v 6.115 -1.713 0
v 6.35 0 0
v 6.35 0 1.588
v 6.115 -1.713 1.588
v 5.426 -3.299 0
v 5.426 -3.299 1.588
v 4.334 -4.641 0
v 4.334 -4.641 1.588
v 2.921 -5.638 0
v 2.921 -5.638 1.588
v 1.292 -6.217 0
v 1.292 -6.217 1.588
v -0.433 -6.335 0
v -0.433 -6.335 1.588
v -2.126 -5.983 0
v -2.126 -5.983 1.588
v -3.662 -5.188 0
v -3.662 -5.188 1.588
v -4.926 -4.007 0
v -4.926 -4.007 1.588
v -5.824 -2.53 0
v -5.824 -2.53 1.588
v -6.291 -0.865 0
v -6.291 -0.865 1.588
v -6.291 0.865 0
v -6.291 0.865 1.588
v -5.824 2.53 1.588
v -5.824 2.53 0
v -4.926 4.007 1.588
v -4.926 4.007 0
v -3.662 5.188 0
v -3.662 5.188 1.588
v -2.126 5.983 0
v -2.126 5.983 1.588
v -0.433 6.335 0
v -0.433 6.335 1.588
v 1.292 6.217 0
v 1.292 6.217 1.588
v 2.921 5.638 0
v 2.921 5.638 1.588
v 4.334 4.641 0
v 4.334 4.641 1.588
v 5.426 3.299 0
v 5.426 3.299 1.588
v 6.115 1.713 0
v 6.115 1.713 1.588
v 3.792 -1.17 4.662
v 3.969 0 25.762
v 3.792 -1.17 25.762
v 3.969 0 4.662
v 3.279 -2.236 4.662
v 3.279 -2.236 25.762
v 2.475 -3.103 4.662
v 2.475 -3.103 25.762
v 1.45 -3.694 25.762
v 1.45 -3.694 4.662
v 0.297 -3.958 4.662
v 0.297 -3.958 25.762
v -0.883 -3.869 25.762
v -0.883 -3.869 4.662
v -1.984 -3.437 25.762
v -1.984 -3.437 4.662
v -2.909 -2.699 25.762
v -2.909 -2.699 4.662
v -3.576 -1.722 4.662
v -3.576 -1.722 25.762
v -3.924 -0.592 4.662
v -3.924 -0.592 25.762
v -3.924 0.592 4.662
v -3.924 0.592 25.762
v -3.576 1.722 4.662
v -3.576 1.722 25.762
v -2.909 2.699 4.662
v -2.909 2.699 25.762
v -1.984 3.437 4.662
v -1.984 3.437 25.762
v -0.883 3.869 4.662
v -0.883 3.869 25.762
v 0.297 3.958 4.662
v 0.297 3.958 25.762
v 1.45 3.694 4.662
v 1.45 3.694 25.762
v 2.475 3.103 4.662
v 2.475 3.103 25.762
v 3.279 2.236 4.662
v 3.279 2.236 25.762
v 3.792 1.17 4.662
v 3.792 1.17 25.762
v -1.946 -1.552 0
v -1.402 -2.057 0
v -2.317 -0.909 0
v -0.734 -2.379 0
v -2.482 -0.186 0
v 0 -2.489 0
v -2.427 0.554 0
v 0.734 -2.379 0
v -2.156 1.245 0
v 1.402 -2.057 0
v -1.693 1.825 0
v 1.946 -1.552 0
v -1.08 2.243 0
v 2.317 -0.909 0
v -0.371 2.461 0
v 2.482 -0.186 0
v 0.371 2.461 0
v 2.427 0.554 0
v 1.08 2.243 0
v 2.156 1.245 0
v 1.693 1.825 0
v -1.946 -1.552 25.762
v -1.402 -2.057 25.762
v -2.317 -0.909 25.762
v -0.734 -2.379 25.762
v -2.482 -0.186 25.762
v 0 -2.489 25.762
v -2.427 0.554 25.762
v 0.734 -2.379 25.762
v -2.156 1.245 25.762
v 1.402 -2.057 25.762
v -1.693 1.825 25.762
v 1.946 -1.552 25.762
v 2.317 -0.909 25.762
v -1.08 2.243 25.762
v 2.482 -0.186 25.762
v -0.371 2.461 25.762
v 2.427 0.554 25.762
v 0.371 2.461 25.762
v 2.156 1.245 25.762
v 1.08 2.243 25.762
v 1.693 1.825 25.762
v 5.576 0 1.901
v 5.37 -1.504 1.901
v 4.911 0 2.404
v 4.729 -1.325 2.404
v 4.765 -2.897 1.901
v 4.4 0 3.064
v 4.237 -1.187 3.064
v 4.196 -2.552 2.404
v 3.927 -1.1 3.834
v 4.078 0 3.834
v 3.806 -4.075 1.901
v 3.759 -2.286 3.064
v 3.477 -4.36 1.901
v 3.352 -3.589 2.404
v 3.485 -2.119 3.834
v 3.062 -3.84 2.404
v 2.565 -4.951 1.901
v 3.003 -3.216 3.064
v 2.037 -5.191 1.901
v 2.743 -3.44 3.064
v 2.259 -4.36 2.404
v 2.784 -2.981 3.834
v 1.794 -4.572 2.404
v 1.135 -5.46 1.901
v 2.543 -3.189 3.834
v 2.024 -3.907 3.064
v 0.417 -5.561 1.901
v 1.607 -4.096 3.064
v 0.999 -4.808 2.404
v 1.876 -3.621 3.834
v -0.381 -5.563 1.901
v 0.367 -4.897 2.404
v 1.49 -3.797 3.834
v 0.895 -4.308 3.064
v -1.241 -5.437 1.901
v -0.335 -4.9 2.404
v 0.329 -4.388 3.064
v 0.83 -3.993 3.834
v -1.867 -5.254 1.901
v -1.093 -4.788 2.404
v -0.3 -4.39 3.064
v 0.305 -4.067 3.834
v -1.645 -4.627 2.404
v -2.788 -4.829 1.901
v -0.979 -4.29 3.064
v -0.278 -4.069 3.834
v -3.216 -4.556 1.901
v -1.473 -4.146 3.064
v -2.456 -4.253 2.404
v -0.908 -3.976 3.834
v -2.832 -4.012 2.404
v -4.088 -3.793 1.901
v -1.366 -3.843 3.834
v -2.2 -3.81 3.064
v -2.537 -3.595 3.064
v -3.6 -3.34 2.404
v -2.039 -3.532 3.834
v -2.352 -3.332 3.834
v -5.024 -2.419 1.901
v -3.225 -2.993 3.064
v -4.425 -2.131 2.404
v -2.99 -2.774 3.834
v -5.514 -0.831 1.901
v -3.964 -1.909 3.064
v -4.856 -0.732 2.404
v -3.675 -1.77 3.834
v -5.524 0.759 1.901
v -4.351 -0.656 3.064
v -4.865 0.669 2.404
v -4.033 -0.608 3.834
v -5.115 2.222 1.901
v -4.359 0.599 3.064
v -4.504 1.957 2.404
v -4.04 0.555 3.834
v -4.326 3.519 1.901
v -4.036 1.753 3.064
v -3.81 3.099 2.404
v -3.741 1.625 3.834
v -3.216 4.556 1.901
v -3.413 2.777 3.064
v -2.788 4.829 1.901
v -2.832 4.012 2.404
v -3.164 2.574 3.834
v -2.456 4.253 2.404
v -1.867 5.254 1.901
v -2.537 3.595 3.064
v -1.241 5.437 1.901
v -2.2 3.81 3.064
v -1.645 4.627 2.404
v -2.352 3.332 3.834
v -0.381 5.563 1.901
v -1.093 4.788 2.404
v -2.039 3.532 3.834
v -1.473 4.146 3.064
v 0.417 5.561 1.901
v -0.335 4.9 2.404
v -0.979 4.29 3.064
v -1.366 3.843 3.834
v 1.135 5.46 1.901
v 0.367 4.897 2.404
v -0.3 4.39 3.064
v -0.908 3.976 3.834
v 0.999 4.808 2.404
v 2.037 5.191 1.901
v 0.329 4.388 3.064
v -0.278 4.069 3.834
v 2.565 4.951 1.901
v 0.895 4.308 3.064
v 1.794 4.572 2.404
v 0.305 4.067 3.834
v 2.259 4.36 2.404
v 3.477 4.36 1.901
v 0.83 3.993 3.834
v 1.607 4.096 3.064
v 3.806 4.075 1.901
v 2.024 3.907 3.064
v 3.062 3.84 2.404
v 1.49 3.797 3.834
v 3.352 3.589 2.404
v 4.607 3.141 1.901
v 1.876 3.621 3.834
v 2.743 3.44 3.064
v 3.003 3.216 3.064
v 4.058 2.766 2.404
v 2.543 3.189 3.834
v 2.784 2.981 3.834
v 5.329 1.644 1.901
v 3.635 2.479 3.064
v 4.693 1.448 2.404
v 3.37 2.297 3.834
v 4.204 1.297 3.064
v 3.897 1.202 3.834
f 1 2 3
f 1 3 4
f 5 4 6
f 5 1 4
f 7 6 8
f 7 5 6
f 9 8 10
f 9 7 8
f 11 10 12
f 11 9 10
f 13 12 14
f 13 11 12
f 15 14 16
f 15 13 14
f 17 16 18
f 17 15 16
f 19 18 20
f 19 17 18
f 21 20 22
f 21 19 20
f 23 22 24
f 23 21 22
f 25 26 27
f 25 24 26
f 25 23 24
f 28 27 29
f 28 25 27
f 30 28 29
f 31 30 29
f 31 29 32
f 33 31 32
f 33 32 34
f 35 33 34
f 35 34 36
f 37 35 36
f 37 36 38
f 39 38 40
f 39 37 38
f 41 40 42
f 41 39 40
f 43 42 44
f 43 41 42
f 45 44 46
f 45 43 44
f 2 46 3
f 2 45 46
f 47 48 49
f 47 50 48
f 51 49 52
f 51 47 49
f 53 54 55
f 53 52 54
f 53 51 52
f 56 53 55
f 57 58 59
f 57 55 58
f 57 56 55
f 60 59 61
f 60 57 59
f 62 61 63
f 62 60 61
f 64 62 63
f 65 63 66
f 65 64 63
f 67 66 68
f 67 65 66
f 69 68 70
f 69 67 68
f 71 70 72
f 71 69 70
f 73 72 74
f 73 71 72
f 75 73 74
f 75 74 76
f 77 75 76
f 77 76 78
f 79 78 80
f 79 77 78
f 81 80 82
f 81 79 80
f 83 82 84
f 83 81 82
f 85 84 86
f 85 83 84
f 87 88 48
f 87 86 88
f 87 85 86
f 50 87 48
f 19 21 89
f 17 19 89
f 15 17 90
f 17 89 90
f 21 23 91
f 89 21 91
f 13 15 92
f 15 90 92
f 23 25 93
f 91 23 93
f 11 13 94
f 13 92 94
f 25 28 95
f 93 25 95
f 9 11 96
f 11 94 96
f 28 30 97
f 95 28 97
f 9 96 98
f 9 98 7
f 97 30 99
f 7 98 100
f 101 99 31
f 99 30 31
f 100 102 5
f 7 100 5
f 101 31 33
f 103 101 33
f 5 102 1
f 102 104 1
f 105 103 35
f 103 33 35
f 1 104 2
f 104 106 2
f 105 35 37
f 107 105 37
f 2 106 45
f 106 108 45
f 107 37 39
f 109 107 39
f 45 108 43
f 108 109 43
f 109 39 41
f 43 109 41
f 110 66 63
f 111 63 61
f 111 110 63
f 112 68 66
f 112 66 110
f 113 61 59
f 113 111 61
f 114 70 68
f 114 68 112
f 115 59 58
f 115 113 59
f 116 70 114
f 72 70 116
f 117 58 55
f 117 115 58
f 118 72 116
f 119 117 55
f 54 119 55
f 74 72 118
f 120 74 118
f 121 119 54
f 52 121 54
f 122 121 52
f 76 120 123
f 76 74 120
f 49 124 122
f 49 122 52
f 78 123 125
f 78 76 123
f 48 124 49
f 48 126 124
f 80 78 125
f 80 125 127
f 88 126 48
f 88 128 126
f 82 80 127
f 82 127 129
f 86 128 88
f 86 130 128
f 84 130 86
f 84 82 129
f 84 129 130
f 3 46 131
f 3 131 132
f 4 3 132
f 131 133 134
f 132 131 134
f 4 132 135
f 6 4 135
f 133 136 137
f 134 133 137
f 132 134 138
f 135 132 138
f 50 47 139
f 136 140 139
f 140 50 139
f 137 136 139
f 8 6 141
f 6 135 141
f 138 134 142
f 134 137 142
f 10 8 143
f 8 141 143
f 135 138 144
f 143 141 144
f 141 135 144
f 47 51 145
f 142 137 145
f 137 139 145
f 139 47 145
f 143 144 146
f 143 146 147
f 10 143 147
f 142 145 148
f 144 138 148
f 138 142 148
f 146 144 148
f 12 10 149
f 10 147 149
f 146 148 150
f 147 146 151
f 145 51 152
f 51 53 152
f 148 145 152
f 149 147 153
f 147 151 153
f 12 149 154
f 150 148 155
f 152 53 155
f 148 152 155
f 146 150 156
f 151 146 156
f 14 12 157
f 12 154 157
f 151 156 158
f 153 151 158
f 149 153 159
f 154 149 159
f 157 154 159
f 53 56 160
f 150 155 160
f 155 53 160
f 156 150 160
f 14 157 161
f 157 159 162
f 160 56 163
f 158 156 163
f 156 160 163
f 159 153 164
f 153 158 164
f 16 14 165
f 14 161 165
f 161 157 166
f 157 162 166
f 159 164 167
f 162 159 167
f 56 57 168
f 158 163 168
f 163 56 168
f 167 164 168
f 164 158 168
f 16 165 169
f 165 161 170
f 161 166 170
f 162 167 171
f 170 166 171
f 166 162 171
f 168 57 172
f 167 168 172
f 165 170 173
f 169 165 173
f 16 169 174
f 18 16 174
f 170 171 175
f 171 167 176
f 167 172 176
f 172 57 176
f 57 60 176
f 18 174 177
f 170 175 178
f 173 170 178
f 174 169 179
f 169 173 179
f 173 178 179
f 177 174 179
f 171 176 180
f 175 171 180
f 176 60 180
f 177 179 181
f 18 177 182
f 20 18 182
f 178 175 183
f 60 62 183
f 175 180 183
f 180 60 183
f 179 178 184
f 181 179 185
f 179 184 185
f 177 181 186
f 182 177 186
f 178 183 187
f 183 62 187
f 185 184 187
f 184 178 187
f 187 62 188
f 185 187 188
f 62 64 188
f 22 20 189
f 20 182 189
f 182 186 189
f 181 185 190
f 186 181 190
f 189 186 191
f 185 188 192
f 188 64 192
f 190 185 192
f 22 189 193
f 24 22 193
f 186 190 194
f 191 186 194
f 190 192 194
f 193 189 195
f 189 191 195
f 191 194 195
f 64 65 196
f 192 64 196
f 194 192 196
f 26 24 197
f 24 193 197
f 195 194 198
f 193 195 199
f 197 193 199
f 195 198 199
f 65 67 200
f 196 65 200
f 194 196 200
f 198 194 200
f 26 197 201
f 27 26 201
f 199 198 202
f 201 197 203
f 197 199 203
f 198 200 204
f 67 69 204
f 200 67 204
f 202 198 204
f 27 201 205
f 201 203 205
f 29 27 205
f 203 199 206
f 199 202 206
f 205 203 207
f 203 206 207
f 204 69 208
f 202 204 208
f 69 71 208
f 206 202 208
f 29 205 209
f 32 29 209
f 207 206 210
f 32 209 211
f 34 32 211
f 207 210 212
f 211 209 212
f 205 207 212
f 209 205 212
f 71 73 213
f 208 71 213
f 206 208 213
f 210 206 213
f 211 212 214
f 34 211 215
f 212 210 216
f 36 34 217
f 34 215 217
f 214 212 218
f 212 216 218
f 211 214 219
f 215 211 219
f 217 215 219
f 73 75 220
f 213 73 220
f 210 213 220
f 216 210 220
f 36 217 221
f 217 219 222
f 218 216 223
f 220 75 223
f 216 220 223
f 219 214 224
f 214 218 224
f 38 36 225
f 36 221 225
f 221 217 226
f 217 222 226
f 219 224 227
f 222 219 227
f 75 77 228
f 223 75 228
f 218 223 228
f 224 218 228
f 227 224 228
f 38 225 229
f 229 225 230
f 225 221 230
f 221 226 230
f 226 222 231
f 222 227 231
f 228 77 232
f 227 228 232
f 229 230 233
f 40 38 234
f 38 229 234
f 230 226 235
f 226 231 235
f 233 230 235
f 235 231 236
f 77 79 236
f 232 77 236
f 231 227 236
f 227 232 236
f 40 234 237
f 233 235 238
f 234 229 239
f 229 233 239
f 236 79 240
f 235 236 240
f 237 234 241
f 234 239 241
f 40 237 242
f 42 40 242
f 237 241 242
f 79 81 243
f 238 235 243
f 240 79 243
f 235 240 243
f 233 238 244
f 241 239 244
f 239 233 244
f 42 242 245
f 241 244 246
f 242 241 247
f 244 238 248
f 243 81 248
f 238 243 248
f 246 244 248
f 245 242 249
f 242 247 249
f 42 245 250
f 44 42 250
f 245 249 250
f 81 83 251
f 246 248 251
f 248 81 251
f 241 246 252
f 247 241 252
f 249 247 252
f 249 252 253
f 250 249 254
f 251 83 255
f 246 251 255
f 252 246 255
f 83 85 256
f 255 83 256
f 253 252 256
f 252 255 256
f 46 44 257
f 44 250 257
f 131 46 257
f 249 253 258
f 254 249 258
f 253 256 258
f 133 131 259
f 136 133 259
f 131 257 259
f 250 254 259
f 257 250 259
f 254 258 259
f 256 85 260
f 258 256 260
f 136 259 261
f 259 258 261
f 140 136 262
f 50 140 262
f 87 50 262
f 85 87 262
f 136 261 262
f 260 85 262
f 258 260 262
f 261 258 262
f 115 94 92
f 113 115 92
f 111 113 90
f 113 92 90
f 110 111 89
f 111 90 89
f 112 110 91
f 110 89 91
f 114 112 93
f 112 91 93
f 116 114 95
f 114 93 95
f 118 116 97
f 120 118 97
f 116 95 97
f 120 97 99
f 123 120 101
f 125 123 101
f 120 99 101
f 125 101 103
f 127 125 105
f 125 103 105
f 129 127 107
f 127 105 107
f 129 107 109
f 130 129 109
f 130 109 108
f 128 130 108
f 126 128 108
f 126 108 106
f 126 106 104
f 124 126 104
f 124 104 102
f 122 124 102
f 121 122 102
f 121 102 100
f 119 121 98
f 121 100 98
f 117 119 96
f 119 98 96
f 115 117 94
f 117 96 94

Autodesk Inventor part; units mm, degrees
ref_plane "YZ Plane" through (0, 0, 0) normal (1, 0, 0) x (0, 1, 0)
ref_plane "XZ Plane" through (0, 0, 0) normal (0, 1, 0) x (-1, 0, 0)
ref_plane "XY Plane" through (0, 0, 0) normal (0, 0, 1) x (1, 0, 0)
sketch "Sketch1" plane through (0, 0, 0) normal (0, 0, 1) x (1, 0, 0)
  circle A0 centre (0, 0) radius 6.35
  dimension "d0" = 12.7
extrude "Extrusion1" add sketch "Sketch1" along normal blind 1.5875
sketch "Sketch2" plane through (0, 0, 1.5875) normal (0, 0, 1) x (1, 0, 0)
  circle A0 centre (0, 0) radius 6.35 projected
  circle A1 centre (0, 0) radius 3.9688
  dimension "d3" = 7.9375
extrude "Extrusion2" add sketch "Sketch2" along normal blind 24.1745 contours A1
fillet "Fillet1" radius 3.175 1 edges at (-3.9688, 0, 1.5875)
sketch "Sketch3" plane through (0, 0, 25.762) normal (0, 0, 1) x (1, 0, 0)
  circle A0 centre (0, 0) radius 3.9687 projected
hole "Hole1" at (0, 0, 25.762) direction (0, 0, -1) diameter 4.9784 end through all clearance for "Flat Head Machine Screw (82)" size "#10" standard "Ansi Unified Screw Threads"
properties part number "Pneumatic Standoff Curved" material "Aluminum 6061"
